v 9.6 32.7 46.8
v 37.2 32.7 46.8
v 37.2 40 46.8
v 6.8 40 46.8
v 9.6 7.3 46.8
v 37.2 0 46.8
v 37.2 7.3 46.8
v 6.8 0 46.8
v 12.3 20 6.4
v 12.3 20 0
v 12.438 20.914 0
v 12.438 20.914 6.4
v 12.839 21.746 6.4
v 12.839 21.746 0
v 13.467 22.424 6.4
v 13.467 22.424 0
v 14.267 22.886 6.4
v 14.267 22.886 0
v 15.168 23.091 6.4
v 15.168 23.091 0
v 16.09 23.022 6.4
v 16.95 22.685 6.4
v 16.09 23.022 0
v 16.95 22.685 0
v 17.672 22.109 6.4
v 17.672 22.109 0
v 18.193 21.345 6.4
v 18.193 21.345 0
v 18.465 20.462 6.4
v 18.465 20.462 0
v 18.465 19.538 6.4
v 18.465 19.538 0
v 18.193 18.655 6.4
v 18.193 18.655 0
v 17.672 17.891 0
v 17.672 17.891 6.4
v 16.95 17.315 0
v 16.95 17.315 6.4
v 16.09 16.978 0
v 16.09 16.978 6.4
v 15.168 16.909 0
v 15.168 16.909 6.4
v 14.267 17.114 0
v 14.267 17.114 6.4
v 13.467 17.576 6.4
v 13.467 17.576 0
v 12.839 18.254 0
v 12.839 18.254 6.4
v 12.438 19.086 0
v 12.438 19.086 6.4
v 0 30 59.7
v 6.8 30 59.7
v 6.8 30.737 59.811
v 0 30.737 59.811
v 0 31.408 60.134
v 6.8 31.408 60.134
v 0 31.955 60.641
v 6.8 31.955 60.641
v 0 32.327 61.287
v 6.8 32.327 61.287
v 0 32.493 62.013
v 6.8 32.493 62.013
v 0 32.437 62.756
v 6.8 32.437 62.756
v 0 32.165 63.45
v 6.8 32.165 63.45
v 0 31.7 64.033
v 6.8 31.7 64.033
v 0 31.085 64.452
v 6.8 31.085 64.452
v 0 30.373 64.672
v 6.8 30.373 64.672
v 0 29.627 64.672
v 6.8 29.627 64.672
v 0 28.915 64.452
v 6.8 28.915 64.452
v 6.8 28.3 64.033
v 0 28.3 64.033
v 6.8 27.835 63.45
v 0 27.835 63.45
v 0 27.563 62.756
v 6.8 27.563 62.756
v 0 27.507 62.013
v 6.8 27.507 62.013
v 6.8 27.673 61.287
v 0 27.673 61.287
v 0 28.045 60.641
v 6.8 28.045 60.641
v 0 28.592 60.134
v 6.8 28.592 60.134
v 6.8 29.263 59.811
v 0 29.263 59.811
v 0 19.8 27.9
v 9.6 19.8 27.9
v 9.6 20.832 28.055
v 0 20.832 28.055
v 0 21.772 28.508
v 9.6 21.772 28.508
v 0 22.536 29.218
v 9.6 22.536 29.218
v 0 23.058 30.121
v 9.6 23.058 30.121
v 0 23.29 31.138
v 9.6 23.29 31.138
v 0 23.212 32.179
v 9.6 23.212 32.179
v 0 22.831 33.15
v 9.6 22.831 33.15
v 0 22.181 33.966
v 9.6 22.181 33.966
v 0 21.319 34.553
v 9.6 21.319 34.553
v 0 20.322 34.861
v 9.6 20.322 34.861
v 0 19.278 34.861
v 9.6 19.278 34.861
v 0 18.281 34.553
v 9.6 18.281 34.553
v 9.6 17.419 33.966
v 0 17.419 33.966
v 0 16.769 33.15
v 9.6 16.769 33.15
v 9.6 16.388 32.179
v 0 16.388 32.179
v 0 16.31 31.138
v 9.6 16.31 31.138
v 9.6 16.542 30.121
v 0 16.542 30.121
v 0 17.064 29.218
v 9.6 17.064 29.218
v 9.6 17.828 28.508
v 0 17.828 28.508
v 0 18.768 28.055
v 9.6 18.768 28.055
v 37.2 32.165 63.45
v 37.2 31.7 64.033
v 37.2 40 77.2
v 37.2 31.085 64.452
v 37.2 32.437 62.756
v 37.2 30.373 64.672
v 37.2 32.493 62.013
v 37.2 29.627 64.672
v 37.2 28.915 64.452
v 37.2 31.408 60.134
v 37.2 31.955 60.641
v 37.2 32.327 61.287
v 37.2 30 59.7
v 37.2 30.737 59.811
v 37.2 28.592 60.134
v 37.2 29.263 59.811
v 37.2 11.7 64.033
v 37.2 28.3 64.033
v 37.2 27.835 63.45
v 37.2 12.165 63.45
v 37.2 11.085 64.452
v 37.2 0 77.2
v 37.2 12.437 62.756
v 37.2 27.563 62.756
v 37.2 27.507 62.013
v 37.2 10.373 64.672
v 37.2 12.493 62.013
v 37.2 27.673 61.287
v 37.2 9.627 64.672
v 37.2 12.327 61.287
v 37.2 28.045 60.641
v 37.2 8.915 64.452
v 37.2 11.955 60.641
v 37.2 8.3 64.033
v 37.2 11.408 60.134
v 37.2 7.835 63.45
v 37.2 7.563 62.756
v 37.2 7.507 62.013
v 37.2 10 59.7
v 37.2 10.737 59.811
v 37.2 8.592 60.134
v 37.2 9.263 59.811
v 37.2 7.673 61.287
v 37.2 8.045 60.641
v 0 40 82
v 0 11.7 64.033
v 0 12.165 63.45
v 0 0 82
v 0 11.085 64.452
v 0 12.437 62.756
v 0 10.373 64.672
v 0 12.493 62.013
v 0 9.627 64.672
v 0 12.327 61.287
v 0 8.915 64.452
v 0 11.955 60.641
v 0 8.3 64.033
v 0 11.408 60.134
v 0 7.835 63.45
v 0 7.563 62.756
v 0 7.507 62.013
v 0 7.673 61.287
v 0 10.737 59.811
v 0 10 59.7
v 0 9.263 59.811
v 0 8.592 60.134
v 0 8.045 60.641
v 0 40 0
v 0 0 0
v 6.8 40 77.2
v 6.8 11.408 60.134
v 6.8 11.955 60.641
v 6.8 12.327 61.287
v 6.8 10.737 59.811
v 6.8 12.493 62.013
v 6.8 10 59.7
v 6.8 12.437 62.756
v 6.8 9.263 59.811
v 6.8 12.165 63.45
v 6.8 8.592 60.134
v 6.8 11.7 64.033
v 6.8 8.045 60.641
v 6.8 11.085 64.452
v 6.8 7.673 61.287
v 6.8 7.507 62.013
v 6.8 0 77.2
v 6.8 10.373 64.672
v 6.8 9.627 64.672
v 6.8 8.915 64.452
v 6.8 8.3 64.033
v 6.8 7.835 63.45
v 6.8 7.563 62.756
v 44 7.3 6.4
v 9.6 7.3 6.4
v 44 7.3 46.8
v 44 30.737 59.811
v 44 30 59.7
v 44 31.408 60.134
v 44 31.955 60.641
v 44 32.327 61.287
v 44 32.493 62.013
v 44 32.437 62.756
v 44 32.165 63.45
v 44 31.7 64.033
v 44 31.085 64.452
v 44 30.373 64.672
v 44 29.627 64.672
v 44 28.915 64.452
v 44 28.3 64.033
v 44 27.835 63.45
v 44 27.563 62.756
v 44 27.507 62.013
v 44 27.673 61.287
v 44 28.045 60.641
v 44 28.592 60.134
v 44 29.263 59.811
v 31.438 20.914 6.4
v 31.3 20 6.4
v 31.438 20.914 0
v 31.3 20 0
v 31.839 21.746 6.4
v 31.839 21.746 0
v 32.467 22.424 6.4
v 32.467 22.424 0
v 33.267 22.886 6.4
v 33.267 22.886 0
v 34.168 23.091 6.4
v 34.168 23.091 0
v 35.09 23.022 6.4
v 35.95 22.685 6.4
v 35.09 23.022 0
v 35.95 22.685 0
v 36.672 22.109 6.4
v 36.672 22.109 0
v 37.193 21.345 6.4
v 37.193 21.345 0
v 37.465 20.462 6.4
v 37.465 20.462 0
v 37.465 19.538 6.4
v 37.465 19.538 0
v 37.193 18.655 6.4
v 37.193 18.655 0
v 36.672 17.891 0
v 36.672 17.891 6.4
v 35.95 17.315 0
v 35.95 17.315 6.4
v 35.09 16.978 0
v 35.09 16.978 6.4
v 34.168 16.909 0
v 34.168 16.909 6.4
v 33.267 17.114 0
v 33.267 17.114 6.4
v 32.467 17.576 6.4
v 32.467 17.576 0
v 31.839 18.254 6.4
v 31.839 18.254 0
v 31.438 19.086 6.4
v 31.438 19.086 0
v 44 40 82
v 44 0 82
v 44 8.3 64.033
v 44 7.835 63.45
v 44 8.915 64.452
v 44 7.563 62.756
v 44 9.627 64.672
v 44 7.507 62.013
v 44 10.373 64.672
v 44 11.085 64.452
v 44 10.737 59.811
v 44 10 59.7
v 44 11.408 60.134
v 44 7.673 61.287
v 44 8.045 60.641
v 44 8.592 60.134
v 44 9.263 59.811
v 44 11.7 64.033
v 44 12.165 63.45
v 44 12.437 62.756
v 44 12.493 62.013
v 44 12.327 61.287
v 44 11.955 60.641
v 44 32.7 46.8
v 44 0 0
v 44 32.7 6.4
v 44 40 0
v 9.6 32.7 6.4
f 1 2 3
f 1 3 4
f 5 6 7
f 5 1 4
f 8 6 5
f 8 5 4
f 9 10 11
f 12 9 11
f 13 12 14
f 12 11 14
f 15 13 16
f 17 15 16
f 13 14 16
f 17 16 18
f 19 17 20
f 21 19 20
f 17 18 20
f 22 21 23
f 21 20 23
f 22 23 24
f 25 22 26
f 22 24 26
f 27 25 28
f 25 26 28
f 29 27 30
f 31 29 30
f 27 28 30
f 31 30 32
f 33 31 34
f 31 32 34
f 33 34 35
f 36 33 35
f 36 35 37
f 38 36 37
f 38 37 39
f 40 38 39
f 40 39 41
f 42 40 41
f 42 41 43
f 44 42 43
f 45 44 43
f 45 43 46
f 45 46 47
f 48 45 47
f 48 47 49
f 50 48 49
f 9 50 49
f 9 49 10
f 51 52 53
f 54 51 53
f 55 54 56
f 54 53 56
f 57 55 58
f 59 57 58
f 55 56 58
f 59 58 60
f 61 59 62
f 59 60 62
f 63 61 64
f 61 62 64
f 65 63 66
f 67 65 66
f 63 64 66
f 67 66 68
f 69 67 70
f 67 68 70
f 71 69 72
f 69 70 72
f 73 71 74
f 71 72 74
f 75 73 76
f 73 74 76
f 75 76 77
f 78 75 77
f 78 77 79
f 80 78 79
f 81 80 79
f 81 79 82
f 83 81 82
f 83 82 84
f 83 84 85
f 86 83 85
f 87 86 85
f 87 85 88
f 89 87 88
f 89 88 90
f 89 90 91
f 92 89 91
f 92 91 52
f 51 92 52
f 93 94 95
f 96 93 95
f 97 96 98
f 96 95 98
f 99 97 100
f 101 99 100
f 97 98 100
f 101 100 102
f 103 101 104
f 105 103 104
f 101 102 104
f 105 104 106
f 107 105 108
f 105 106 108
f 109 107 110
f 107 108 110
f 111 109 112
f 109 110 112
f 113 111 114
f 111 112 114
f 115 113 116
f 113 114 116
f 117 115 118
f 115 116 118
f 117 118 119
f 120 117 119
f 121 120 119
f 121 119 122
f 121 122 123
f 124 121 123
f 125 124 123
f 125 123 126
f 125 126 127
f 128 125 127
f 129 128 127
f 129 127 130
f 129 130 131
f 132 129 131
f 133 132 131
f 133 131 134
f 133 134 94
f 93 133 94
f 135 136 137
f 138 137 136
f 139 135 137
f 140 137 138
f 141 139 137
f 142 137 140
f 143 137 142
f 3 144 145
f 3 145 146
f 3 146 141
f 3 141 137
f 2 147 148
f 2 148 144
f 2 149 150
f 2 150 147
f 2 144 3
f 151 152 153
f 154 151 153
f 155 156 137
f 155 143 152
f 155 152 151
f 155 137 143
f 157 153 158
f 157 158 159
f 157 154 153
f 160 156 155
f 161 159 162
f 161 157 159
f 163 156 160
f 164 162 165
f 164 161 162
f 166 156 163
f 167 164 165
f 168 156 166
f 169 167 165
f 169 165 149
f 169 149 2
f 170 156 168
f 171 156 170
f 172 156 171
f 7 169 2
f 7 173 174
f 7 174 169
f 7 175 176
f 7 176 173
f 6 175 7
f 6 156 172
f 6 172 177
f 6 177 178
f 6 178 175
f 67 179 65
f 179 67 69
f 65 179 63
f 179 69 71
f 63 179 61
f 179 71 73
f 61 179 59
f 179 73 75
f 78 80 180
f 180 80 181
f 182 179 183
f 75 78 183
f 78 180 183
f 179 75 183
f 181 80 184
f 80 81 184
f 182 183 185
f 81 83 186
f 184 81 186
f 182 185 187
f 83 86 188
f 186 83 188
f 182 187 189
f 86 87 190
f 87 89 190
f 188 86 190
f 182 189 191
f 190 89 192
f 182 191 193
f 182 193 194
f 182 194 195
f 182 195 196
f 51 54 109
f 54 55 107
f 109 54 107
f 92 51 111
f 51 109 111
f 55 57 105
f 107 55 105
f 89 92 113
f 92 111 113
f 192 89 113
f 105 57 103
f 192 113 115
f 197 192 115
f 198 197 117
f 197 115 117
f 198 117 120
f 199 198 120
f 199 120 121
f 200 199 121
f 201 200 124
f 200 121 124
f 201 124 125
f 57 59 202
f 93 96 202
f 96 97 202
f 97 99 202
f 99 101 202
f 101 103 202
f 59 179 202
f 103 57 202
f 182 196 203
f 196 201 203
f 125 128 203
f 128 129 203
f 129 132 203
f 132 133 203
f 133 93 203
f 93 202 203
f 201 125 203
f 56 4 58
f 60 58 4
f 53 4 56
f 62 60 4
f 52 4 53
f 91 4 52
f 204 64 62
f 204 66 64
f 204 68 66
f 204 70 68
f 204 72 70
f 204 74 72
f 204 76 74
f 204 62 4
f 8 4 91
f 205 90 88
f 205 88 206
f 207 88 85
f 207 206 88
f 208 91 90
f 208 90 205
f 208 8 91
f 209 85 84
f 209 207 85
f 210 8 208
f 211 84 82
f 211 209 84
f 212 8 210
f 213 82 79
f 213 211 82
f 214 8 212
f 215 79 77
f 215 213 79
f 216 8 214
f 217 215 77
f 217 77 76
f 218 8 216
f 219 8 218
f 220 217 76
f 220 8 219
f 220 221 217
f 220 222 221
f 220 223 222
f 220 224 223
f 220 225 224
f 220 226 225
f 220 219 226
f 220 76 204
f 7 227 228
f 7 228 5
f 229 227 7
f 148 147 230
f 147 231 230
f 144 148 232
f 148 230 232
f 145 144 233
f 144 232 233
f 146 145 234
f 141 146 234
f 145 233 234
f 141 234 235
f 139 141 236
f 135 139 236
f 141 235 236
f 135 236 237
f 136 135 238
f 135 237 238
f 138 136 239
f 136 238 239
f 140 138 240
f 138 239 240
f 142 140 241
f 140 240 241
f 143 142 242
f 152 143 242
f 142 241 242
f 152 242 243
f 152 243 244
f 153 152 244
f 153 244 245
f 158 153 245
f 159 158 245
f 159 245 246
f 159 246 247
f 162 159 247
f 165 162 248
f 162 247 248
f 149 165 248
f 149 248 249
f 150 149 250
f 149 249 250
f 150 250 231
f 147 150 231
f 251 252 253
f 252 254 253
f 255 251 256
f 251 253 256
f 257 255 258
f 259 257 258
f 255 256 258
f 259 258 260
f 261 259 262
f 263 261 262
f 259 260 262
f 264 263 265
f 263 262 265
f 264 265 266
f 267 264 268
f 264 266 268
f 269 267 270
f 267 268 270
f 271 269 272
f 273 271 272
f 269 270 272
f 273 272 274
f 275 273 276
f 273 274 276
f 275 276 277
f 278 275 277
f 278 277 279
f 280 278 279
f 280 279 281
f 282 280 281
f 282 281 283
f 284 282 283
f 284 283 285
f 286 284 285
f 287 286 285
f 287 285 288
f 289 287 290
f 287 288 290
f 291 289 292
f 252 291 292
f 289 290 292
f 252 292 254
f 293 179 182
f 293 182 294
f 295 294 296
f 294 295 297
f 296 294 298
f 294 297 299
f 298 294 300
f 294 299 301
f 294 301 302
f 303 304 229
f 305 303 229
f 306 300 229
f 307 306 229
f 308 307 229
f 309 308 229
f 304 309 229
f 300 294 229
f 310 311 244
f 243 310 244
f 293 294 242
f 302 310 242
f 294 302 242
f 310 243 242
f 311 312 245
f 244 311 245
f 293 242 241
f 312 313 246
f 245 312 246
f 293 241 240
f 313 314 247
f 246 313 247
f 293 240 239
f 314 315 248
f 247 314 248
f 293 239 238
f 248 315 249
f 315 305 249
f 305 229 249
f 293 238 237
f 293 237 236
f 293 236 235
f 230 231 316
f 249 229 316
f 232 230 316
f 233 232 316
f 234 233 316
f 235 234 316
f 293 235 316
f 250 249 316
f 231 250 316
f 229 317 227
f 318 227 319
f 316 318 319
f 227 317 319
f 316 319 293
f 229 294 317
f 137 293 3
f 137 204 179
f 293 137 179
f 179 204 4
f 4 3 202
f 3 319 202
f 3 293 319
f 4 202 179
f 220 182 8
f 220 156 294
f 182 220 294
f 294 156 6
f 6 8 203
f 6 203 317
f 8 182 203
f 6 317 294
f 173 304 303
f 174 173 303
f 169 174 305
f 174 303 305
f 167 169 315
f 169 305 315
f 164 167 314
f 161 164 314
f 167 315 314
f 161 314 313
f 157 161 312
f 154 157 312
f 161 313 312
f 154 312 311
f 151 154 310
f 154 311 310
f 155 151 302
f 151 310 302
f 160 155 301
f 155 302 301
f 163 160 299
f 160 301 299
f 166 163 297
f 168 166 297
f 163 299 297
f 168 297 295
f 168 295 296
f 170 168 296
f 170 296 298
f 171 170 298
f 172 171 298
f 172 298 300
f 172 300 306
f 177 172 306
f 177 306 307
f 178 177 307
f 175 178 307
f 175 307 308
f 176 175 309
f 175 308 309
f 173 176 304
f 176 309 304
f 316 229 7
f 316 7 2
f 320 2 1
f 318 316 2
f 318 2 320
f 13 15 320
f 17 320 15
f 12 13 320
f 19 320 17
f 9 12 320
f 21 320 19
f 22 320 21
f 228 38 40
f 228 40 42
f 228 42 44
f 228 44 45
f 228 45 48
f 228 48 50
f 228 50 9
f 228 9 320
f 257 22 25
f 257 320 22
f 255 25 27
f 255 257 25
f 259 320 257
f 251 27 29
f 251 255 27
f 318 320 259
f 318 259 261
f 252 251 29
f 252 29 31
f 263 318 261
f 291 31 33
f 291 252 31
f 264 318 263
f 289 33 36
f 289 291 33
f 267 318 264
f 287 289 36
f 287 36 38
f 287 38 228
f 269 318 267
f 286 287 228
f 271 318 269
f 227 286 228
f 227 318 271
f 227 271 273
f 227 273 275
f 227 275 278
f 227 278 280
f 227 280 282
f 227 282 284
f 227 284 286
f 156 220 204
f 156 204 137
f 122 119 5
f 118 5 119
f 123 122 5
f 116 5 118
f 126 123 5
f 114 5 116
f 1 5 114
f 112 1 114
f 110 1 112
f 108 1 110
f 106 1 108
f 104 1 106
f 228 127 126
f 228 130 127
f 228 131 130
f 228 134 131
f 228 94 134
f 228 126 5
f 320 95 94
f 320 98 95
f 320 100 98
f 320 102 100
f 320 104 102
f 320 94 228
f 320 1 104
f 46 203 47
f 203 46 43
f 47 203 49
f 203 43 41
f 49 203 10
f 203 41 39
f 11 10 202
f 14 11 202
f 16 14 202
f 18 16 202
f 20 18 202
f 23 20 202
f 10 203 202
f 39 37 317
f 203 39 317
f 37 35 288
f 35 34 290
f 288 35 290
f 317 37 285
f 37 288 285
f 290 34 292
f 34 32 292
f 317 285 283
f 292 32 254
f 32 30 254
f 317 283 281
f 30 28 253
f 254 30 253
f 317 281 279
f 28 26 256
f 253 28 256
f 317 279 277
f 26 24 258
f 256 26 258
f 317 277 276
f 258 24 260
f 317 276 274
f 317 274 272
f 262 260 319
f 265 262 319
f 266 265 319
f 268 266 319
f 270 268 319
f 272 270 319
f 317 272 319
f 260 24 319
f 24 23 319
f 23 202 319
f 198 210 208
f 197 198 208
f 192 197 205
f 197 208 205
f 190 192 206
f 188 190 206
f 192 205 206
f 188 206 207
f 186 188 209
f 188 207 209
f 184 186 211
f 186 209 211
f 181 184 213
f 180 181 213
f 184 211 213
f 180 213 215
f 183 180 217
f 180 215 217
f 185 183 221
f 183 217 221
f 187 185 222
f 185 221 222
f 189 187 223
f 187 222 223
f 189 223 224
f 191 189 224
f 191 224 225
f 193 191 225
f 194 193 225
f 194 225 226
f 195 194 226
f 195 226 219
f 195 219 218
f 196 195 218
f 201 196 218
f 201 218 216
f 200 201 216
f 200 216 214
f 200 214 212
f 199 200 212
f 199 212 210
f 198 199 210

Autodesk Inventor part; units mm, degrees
ref_plane "YZ Plane" through (0, 0, 0) normal (1, 0, 0) x (0, 1, 0)
ref_plane "XZ Plane" through (0, 0, 0) normal (0, 1, 0) x (-1, 0, 0)
ref_plane "XY Plane" through (0, 0, 0) normal (0, 0, 1) x (1, 0, 0)
sketch "Sketch1" plane through (0, 0, 0) normal (0, 0, 1) x (1, 0, 0)
  line L0 (0, 0) -> (44, 0)
  line L1 (44, 0) -> (44, 40)
  line L2 (44, 40) -> (0, 40)
  line L3 (0, 40) -> (0, 0)
  dimension "d0" = 44
  dimension "d1" = 40
extrude "Extrusion1" add sketch "Sketch1" along normal blind 82
sketch "Sketch2" plane through (0, 0, 0) normal (0, -1, 0) x (1, 0, 0)
  line L0 (6.8, 77.2) -> (37.2, 77.2)
  line L1 (37.2, 77.2) -> (37.2, 46.8)
  line L2 (37.2, 46.8) -> (6.8, 46.8)
  line L3 (6.8, 46.8) -> (6.8, 77.2)
  line L4 (0, 0) -> (0, 82) projected
  line L5 (0, 82) -> (44, 82) projected
  dimension "d4" = 30.4
  dimension "d5" = 30.4
  dimension "d6" = 6.8
  dimension "d7" = 4.8
extrude "Extrusion2" cut sketch "Sketch2" against normal blind 50
sketch "Sketch4" plane through (44, 0, 0) normal (1, 0, 0) x (0, 0, -1)
  line L0 (-6.4, 7.3) -> (-46.8, 7.3)
  line L1 (-46.8, 7.3) -> (-46.8, 32.7)
  line L2 (-46.8, 32.7) -> (-6.4, 32.7)
  line L3 (-6.4, 32.7) -> (-6.4, 7.3)
  line L4 (0, 0) -> (0, 40) projected
  line L5 (0, 0) -> (-82, 0) projected
  line L6 (-46.8, 0) -> (-46.8, 40) projected
  point P0 (0, 20)
  point P1 (-6.4, 20)
  dimension "d10" = 25.4
  dimension "d11" = 40.4
  dimension "d13" = 7.3
extrude "Extrusion3" cut sketch "Sketch4" against normal blind 34.4
sketch "Sketch6" plane through (44, 0, 0) normal (1, 0, 0) x (0, 0, -1)
  circle A0 centre (-62.2, 30) radius 2.5
  circle A1 centre (-62.2, 10) radius 2.5
  line L0 (0, 40) -> (-82, 40) projected
  line L1 (0, 0) -> (-82, 0) projected
  point P0 (-77.2, 40)
  dimension "d24" = 5
  dimension "d25" = 10
  dimension "d26" = 5
  dimension "d27" = 10
  dimension "d28" = 15
  dimension "d29" = 15
extrude "Extrusion5" cut sketch "Sketch6" against normal blind 50
sketch "Sketch5" plane through (0, 0, 0) normal (0, 0, -1) x (-1, 0, 0)
  circle A0 centre (-15.4, 20) radius 3.1
  circle A1 centre (-34.4, 20) radius 3.1
  line L0 (-44, 40) -> (0, 40) projected
  line L1 (-9.6, 7.3) -> (-9.6, 32.7) projected
  point P0 (0, 0)
  dimension "d16" = 6.2
  dimension "d17" = 6.2
  dimension "d18" = 20
  dimension "d19" = 20
  dimension "d20" = 5.8
  dimension "d21" = 19
extrude "Extrusion4" cut sketch "Sketch5" against normal blind 34
sketch "Sketch7" plane through (9.6, 0, 0) normal (1, 0, 0) x (0, 0, -1)
  circle A0 centre (-31.4, 19.8) radius 3.5
  line L0 (-6.4, 32.7) -> (-6.4, 7.3) projected
  line L1 (-6.4, 7.3) -> (-46.8, 7.3) projected
  point P0 (0, 0)
  dimension "d32" = 7
  dimension "d33" = 25
  dimension "d34" = 12.5
extrude "Extrusion6" cut sketch "Sketch7" against normal blind 34.4
properties part number "loacell_mount1"
